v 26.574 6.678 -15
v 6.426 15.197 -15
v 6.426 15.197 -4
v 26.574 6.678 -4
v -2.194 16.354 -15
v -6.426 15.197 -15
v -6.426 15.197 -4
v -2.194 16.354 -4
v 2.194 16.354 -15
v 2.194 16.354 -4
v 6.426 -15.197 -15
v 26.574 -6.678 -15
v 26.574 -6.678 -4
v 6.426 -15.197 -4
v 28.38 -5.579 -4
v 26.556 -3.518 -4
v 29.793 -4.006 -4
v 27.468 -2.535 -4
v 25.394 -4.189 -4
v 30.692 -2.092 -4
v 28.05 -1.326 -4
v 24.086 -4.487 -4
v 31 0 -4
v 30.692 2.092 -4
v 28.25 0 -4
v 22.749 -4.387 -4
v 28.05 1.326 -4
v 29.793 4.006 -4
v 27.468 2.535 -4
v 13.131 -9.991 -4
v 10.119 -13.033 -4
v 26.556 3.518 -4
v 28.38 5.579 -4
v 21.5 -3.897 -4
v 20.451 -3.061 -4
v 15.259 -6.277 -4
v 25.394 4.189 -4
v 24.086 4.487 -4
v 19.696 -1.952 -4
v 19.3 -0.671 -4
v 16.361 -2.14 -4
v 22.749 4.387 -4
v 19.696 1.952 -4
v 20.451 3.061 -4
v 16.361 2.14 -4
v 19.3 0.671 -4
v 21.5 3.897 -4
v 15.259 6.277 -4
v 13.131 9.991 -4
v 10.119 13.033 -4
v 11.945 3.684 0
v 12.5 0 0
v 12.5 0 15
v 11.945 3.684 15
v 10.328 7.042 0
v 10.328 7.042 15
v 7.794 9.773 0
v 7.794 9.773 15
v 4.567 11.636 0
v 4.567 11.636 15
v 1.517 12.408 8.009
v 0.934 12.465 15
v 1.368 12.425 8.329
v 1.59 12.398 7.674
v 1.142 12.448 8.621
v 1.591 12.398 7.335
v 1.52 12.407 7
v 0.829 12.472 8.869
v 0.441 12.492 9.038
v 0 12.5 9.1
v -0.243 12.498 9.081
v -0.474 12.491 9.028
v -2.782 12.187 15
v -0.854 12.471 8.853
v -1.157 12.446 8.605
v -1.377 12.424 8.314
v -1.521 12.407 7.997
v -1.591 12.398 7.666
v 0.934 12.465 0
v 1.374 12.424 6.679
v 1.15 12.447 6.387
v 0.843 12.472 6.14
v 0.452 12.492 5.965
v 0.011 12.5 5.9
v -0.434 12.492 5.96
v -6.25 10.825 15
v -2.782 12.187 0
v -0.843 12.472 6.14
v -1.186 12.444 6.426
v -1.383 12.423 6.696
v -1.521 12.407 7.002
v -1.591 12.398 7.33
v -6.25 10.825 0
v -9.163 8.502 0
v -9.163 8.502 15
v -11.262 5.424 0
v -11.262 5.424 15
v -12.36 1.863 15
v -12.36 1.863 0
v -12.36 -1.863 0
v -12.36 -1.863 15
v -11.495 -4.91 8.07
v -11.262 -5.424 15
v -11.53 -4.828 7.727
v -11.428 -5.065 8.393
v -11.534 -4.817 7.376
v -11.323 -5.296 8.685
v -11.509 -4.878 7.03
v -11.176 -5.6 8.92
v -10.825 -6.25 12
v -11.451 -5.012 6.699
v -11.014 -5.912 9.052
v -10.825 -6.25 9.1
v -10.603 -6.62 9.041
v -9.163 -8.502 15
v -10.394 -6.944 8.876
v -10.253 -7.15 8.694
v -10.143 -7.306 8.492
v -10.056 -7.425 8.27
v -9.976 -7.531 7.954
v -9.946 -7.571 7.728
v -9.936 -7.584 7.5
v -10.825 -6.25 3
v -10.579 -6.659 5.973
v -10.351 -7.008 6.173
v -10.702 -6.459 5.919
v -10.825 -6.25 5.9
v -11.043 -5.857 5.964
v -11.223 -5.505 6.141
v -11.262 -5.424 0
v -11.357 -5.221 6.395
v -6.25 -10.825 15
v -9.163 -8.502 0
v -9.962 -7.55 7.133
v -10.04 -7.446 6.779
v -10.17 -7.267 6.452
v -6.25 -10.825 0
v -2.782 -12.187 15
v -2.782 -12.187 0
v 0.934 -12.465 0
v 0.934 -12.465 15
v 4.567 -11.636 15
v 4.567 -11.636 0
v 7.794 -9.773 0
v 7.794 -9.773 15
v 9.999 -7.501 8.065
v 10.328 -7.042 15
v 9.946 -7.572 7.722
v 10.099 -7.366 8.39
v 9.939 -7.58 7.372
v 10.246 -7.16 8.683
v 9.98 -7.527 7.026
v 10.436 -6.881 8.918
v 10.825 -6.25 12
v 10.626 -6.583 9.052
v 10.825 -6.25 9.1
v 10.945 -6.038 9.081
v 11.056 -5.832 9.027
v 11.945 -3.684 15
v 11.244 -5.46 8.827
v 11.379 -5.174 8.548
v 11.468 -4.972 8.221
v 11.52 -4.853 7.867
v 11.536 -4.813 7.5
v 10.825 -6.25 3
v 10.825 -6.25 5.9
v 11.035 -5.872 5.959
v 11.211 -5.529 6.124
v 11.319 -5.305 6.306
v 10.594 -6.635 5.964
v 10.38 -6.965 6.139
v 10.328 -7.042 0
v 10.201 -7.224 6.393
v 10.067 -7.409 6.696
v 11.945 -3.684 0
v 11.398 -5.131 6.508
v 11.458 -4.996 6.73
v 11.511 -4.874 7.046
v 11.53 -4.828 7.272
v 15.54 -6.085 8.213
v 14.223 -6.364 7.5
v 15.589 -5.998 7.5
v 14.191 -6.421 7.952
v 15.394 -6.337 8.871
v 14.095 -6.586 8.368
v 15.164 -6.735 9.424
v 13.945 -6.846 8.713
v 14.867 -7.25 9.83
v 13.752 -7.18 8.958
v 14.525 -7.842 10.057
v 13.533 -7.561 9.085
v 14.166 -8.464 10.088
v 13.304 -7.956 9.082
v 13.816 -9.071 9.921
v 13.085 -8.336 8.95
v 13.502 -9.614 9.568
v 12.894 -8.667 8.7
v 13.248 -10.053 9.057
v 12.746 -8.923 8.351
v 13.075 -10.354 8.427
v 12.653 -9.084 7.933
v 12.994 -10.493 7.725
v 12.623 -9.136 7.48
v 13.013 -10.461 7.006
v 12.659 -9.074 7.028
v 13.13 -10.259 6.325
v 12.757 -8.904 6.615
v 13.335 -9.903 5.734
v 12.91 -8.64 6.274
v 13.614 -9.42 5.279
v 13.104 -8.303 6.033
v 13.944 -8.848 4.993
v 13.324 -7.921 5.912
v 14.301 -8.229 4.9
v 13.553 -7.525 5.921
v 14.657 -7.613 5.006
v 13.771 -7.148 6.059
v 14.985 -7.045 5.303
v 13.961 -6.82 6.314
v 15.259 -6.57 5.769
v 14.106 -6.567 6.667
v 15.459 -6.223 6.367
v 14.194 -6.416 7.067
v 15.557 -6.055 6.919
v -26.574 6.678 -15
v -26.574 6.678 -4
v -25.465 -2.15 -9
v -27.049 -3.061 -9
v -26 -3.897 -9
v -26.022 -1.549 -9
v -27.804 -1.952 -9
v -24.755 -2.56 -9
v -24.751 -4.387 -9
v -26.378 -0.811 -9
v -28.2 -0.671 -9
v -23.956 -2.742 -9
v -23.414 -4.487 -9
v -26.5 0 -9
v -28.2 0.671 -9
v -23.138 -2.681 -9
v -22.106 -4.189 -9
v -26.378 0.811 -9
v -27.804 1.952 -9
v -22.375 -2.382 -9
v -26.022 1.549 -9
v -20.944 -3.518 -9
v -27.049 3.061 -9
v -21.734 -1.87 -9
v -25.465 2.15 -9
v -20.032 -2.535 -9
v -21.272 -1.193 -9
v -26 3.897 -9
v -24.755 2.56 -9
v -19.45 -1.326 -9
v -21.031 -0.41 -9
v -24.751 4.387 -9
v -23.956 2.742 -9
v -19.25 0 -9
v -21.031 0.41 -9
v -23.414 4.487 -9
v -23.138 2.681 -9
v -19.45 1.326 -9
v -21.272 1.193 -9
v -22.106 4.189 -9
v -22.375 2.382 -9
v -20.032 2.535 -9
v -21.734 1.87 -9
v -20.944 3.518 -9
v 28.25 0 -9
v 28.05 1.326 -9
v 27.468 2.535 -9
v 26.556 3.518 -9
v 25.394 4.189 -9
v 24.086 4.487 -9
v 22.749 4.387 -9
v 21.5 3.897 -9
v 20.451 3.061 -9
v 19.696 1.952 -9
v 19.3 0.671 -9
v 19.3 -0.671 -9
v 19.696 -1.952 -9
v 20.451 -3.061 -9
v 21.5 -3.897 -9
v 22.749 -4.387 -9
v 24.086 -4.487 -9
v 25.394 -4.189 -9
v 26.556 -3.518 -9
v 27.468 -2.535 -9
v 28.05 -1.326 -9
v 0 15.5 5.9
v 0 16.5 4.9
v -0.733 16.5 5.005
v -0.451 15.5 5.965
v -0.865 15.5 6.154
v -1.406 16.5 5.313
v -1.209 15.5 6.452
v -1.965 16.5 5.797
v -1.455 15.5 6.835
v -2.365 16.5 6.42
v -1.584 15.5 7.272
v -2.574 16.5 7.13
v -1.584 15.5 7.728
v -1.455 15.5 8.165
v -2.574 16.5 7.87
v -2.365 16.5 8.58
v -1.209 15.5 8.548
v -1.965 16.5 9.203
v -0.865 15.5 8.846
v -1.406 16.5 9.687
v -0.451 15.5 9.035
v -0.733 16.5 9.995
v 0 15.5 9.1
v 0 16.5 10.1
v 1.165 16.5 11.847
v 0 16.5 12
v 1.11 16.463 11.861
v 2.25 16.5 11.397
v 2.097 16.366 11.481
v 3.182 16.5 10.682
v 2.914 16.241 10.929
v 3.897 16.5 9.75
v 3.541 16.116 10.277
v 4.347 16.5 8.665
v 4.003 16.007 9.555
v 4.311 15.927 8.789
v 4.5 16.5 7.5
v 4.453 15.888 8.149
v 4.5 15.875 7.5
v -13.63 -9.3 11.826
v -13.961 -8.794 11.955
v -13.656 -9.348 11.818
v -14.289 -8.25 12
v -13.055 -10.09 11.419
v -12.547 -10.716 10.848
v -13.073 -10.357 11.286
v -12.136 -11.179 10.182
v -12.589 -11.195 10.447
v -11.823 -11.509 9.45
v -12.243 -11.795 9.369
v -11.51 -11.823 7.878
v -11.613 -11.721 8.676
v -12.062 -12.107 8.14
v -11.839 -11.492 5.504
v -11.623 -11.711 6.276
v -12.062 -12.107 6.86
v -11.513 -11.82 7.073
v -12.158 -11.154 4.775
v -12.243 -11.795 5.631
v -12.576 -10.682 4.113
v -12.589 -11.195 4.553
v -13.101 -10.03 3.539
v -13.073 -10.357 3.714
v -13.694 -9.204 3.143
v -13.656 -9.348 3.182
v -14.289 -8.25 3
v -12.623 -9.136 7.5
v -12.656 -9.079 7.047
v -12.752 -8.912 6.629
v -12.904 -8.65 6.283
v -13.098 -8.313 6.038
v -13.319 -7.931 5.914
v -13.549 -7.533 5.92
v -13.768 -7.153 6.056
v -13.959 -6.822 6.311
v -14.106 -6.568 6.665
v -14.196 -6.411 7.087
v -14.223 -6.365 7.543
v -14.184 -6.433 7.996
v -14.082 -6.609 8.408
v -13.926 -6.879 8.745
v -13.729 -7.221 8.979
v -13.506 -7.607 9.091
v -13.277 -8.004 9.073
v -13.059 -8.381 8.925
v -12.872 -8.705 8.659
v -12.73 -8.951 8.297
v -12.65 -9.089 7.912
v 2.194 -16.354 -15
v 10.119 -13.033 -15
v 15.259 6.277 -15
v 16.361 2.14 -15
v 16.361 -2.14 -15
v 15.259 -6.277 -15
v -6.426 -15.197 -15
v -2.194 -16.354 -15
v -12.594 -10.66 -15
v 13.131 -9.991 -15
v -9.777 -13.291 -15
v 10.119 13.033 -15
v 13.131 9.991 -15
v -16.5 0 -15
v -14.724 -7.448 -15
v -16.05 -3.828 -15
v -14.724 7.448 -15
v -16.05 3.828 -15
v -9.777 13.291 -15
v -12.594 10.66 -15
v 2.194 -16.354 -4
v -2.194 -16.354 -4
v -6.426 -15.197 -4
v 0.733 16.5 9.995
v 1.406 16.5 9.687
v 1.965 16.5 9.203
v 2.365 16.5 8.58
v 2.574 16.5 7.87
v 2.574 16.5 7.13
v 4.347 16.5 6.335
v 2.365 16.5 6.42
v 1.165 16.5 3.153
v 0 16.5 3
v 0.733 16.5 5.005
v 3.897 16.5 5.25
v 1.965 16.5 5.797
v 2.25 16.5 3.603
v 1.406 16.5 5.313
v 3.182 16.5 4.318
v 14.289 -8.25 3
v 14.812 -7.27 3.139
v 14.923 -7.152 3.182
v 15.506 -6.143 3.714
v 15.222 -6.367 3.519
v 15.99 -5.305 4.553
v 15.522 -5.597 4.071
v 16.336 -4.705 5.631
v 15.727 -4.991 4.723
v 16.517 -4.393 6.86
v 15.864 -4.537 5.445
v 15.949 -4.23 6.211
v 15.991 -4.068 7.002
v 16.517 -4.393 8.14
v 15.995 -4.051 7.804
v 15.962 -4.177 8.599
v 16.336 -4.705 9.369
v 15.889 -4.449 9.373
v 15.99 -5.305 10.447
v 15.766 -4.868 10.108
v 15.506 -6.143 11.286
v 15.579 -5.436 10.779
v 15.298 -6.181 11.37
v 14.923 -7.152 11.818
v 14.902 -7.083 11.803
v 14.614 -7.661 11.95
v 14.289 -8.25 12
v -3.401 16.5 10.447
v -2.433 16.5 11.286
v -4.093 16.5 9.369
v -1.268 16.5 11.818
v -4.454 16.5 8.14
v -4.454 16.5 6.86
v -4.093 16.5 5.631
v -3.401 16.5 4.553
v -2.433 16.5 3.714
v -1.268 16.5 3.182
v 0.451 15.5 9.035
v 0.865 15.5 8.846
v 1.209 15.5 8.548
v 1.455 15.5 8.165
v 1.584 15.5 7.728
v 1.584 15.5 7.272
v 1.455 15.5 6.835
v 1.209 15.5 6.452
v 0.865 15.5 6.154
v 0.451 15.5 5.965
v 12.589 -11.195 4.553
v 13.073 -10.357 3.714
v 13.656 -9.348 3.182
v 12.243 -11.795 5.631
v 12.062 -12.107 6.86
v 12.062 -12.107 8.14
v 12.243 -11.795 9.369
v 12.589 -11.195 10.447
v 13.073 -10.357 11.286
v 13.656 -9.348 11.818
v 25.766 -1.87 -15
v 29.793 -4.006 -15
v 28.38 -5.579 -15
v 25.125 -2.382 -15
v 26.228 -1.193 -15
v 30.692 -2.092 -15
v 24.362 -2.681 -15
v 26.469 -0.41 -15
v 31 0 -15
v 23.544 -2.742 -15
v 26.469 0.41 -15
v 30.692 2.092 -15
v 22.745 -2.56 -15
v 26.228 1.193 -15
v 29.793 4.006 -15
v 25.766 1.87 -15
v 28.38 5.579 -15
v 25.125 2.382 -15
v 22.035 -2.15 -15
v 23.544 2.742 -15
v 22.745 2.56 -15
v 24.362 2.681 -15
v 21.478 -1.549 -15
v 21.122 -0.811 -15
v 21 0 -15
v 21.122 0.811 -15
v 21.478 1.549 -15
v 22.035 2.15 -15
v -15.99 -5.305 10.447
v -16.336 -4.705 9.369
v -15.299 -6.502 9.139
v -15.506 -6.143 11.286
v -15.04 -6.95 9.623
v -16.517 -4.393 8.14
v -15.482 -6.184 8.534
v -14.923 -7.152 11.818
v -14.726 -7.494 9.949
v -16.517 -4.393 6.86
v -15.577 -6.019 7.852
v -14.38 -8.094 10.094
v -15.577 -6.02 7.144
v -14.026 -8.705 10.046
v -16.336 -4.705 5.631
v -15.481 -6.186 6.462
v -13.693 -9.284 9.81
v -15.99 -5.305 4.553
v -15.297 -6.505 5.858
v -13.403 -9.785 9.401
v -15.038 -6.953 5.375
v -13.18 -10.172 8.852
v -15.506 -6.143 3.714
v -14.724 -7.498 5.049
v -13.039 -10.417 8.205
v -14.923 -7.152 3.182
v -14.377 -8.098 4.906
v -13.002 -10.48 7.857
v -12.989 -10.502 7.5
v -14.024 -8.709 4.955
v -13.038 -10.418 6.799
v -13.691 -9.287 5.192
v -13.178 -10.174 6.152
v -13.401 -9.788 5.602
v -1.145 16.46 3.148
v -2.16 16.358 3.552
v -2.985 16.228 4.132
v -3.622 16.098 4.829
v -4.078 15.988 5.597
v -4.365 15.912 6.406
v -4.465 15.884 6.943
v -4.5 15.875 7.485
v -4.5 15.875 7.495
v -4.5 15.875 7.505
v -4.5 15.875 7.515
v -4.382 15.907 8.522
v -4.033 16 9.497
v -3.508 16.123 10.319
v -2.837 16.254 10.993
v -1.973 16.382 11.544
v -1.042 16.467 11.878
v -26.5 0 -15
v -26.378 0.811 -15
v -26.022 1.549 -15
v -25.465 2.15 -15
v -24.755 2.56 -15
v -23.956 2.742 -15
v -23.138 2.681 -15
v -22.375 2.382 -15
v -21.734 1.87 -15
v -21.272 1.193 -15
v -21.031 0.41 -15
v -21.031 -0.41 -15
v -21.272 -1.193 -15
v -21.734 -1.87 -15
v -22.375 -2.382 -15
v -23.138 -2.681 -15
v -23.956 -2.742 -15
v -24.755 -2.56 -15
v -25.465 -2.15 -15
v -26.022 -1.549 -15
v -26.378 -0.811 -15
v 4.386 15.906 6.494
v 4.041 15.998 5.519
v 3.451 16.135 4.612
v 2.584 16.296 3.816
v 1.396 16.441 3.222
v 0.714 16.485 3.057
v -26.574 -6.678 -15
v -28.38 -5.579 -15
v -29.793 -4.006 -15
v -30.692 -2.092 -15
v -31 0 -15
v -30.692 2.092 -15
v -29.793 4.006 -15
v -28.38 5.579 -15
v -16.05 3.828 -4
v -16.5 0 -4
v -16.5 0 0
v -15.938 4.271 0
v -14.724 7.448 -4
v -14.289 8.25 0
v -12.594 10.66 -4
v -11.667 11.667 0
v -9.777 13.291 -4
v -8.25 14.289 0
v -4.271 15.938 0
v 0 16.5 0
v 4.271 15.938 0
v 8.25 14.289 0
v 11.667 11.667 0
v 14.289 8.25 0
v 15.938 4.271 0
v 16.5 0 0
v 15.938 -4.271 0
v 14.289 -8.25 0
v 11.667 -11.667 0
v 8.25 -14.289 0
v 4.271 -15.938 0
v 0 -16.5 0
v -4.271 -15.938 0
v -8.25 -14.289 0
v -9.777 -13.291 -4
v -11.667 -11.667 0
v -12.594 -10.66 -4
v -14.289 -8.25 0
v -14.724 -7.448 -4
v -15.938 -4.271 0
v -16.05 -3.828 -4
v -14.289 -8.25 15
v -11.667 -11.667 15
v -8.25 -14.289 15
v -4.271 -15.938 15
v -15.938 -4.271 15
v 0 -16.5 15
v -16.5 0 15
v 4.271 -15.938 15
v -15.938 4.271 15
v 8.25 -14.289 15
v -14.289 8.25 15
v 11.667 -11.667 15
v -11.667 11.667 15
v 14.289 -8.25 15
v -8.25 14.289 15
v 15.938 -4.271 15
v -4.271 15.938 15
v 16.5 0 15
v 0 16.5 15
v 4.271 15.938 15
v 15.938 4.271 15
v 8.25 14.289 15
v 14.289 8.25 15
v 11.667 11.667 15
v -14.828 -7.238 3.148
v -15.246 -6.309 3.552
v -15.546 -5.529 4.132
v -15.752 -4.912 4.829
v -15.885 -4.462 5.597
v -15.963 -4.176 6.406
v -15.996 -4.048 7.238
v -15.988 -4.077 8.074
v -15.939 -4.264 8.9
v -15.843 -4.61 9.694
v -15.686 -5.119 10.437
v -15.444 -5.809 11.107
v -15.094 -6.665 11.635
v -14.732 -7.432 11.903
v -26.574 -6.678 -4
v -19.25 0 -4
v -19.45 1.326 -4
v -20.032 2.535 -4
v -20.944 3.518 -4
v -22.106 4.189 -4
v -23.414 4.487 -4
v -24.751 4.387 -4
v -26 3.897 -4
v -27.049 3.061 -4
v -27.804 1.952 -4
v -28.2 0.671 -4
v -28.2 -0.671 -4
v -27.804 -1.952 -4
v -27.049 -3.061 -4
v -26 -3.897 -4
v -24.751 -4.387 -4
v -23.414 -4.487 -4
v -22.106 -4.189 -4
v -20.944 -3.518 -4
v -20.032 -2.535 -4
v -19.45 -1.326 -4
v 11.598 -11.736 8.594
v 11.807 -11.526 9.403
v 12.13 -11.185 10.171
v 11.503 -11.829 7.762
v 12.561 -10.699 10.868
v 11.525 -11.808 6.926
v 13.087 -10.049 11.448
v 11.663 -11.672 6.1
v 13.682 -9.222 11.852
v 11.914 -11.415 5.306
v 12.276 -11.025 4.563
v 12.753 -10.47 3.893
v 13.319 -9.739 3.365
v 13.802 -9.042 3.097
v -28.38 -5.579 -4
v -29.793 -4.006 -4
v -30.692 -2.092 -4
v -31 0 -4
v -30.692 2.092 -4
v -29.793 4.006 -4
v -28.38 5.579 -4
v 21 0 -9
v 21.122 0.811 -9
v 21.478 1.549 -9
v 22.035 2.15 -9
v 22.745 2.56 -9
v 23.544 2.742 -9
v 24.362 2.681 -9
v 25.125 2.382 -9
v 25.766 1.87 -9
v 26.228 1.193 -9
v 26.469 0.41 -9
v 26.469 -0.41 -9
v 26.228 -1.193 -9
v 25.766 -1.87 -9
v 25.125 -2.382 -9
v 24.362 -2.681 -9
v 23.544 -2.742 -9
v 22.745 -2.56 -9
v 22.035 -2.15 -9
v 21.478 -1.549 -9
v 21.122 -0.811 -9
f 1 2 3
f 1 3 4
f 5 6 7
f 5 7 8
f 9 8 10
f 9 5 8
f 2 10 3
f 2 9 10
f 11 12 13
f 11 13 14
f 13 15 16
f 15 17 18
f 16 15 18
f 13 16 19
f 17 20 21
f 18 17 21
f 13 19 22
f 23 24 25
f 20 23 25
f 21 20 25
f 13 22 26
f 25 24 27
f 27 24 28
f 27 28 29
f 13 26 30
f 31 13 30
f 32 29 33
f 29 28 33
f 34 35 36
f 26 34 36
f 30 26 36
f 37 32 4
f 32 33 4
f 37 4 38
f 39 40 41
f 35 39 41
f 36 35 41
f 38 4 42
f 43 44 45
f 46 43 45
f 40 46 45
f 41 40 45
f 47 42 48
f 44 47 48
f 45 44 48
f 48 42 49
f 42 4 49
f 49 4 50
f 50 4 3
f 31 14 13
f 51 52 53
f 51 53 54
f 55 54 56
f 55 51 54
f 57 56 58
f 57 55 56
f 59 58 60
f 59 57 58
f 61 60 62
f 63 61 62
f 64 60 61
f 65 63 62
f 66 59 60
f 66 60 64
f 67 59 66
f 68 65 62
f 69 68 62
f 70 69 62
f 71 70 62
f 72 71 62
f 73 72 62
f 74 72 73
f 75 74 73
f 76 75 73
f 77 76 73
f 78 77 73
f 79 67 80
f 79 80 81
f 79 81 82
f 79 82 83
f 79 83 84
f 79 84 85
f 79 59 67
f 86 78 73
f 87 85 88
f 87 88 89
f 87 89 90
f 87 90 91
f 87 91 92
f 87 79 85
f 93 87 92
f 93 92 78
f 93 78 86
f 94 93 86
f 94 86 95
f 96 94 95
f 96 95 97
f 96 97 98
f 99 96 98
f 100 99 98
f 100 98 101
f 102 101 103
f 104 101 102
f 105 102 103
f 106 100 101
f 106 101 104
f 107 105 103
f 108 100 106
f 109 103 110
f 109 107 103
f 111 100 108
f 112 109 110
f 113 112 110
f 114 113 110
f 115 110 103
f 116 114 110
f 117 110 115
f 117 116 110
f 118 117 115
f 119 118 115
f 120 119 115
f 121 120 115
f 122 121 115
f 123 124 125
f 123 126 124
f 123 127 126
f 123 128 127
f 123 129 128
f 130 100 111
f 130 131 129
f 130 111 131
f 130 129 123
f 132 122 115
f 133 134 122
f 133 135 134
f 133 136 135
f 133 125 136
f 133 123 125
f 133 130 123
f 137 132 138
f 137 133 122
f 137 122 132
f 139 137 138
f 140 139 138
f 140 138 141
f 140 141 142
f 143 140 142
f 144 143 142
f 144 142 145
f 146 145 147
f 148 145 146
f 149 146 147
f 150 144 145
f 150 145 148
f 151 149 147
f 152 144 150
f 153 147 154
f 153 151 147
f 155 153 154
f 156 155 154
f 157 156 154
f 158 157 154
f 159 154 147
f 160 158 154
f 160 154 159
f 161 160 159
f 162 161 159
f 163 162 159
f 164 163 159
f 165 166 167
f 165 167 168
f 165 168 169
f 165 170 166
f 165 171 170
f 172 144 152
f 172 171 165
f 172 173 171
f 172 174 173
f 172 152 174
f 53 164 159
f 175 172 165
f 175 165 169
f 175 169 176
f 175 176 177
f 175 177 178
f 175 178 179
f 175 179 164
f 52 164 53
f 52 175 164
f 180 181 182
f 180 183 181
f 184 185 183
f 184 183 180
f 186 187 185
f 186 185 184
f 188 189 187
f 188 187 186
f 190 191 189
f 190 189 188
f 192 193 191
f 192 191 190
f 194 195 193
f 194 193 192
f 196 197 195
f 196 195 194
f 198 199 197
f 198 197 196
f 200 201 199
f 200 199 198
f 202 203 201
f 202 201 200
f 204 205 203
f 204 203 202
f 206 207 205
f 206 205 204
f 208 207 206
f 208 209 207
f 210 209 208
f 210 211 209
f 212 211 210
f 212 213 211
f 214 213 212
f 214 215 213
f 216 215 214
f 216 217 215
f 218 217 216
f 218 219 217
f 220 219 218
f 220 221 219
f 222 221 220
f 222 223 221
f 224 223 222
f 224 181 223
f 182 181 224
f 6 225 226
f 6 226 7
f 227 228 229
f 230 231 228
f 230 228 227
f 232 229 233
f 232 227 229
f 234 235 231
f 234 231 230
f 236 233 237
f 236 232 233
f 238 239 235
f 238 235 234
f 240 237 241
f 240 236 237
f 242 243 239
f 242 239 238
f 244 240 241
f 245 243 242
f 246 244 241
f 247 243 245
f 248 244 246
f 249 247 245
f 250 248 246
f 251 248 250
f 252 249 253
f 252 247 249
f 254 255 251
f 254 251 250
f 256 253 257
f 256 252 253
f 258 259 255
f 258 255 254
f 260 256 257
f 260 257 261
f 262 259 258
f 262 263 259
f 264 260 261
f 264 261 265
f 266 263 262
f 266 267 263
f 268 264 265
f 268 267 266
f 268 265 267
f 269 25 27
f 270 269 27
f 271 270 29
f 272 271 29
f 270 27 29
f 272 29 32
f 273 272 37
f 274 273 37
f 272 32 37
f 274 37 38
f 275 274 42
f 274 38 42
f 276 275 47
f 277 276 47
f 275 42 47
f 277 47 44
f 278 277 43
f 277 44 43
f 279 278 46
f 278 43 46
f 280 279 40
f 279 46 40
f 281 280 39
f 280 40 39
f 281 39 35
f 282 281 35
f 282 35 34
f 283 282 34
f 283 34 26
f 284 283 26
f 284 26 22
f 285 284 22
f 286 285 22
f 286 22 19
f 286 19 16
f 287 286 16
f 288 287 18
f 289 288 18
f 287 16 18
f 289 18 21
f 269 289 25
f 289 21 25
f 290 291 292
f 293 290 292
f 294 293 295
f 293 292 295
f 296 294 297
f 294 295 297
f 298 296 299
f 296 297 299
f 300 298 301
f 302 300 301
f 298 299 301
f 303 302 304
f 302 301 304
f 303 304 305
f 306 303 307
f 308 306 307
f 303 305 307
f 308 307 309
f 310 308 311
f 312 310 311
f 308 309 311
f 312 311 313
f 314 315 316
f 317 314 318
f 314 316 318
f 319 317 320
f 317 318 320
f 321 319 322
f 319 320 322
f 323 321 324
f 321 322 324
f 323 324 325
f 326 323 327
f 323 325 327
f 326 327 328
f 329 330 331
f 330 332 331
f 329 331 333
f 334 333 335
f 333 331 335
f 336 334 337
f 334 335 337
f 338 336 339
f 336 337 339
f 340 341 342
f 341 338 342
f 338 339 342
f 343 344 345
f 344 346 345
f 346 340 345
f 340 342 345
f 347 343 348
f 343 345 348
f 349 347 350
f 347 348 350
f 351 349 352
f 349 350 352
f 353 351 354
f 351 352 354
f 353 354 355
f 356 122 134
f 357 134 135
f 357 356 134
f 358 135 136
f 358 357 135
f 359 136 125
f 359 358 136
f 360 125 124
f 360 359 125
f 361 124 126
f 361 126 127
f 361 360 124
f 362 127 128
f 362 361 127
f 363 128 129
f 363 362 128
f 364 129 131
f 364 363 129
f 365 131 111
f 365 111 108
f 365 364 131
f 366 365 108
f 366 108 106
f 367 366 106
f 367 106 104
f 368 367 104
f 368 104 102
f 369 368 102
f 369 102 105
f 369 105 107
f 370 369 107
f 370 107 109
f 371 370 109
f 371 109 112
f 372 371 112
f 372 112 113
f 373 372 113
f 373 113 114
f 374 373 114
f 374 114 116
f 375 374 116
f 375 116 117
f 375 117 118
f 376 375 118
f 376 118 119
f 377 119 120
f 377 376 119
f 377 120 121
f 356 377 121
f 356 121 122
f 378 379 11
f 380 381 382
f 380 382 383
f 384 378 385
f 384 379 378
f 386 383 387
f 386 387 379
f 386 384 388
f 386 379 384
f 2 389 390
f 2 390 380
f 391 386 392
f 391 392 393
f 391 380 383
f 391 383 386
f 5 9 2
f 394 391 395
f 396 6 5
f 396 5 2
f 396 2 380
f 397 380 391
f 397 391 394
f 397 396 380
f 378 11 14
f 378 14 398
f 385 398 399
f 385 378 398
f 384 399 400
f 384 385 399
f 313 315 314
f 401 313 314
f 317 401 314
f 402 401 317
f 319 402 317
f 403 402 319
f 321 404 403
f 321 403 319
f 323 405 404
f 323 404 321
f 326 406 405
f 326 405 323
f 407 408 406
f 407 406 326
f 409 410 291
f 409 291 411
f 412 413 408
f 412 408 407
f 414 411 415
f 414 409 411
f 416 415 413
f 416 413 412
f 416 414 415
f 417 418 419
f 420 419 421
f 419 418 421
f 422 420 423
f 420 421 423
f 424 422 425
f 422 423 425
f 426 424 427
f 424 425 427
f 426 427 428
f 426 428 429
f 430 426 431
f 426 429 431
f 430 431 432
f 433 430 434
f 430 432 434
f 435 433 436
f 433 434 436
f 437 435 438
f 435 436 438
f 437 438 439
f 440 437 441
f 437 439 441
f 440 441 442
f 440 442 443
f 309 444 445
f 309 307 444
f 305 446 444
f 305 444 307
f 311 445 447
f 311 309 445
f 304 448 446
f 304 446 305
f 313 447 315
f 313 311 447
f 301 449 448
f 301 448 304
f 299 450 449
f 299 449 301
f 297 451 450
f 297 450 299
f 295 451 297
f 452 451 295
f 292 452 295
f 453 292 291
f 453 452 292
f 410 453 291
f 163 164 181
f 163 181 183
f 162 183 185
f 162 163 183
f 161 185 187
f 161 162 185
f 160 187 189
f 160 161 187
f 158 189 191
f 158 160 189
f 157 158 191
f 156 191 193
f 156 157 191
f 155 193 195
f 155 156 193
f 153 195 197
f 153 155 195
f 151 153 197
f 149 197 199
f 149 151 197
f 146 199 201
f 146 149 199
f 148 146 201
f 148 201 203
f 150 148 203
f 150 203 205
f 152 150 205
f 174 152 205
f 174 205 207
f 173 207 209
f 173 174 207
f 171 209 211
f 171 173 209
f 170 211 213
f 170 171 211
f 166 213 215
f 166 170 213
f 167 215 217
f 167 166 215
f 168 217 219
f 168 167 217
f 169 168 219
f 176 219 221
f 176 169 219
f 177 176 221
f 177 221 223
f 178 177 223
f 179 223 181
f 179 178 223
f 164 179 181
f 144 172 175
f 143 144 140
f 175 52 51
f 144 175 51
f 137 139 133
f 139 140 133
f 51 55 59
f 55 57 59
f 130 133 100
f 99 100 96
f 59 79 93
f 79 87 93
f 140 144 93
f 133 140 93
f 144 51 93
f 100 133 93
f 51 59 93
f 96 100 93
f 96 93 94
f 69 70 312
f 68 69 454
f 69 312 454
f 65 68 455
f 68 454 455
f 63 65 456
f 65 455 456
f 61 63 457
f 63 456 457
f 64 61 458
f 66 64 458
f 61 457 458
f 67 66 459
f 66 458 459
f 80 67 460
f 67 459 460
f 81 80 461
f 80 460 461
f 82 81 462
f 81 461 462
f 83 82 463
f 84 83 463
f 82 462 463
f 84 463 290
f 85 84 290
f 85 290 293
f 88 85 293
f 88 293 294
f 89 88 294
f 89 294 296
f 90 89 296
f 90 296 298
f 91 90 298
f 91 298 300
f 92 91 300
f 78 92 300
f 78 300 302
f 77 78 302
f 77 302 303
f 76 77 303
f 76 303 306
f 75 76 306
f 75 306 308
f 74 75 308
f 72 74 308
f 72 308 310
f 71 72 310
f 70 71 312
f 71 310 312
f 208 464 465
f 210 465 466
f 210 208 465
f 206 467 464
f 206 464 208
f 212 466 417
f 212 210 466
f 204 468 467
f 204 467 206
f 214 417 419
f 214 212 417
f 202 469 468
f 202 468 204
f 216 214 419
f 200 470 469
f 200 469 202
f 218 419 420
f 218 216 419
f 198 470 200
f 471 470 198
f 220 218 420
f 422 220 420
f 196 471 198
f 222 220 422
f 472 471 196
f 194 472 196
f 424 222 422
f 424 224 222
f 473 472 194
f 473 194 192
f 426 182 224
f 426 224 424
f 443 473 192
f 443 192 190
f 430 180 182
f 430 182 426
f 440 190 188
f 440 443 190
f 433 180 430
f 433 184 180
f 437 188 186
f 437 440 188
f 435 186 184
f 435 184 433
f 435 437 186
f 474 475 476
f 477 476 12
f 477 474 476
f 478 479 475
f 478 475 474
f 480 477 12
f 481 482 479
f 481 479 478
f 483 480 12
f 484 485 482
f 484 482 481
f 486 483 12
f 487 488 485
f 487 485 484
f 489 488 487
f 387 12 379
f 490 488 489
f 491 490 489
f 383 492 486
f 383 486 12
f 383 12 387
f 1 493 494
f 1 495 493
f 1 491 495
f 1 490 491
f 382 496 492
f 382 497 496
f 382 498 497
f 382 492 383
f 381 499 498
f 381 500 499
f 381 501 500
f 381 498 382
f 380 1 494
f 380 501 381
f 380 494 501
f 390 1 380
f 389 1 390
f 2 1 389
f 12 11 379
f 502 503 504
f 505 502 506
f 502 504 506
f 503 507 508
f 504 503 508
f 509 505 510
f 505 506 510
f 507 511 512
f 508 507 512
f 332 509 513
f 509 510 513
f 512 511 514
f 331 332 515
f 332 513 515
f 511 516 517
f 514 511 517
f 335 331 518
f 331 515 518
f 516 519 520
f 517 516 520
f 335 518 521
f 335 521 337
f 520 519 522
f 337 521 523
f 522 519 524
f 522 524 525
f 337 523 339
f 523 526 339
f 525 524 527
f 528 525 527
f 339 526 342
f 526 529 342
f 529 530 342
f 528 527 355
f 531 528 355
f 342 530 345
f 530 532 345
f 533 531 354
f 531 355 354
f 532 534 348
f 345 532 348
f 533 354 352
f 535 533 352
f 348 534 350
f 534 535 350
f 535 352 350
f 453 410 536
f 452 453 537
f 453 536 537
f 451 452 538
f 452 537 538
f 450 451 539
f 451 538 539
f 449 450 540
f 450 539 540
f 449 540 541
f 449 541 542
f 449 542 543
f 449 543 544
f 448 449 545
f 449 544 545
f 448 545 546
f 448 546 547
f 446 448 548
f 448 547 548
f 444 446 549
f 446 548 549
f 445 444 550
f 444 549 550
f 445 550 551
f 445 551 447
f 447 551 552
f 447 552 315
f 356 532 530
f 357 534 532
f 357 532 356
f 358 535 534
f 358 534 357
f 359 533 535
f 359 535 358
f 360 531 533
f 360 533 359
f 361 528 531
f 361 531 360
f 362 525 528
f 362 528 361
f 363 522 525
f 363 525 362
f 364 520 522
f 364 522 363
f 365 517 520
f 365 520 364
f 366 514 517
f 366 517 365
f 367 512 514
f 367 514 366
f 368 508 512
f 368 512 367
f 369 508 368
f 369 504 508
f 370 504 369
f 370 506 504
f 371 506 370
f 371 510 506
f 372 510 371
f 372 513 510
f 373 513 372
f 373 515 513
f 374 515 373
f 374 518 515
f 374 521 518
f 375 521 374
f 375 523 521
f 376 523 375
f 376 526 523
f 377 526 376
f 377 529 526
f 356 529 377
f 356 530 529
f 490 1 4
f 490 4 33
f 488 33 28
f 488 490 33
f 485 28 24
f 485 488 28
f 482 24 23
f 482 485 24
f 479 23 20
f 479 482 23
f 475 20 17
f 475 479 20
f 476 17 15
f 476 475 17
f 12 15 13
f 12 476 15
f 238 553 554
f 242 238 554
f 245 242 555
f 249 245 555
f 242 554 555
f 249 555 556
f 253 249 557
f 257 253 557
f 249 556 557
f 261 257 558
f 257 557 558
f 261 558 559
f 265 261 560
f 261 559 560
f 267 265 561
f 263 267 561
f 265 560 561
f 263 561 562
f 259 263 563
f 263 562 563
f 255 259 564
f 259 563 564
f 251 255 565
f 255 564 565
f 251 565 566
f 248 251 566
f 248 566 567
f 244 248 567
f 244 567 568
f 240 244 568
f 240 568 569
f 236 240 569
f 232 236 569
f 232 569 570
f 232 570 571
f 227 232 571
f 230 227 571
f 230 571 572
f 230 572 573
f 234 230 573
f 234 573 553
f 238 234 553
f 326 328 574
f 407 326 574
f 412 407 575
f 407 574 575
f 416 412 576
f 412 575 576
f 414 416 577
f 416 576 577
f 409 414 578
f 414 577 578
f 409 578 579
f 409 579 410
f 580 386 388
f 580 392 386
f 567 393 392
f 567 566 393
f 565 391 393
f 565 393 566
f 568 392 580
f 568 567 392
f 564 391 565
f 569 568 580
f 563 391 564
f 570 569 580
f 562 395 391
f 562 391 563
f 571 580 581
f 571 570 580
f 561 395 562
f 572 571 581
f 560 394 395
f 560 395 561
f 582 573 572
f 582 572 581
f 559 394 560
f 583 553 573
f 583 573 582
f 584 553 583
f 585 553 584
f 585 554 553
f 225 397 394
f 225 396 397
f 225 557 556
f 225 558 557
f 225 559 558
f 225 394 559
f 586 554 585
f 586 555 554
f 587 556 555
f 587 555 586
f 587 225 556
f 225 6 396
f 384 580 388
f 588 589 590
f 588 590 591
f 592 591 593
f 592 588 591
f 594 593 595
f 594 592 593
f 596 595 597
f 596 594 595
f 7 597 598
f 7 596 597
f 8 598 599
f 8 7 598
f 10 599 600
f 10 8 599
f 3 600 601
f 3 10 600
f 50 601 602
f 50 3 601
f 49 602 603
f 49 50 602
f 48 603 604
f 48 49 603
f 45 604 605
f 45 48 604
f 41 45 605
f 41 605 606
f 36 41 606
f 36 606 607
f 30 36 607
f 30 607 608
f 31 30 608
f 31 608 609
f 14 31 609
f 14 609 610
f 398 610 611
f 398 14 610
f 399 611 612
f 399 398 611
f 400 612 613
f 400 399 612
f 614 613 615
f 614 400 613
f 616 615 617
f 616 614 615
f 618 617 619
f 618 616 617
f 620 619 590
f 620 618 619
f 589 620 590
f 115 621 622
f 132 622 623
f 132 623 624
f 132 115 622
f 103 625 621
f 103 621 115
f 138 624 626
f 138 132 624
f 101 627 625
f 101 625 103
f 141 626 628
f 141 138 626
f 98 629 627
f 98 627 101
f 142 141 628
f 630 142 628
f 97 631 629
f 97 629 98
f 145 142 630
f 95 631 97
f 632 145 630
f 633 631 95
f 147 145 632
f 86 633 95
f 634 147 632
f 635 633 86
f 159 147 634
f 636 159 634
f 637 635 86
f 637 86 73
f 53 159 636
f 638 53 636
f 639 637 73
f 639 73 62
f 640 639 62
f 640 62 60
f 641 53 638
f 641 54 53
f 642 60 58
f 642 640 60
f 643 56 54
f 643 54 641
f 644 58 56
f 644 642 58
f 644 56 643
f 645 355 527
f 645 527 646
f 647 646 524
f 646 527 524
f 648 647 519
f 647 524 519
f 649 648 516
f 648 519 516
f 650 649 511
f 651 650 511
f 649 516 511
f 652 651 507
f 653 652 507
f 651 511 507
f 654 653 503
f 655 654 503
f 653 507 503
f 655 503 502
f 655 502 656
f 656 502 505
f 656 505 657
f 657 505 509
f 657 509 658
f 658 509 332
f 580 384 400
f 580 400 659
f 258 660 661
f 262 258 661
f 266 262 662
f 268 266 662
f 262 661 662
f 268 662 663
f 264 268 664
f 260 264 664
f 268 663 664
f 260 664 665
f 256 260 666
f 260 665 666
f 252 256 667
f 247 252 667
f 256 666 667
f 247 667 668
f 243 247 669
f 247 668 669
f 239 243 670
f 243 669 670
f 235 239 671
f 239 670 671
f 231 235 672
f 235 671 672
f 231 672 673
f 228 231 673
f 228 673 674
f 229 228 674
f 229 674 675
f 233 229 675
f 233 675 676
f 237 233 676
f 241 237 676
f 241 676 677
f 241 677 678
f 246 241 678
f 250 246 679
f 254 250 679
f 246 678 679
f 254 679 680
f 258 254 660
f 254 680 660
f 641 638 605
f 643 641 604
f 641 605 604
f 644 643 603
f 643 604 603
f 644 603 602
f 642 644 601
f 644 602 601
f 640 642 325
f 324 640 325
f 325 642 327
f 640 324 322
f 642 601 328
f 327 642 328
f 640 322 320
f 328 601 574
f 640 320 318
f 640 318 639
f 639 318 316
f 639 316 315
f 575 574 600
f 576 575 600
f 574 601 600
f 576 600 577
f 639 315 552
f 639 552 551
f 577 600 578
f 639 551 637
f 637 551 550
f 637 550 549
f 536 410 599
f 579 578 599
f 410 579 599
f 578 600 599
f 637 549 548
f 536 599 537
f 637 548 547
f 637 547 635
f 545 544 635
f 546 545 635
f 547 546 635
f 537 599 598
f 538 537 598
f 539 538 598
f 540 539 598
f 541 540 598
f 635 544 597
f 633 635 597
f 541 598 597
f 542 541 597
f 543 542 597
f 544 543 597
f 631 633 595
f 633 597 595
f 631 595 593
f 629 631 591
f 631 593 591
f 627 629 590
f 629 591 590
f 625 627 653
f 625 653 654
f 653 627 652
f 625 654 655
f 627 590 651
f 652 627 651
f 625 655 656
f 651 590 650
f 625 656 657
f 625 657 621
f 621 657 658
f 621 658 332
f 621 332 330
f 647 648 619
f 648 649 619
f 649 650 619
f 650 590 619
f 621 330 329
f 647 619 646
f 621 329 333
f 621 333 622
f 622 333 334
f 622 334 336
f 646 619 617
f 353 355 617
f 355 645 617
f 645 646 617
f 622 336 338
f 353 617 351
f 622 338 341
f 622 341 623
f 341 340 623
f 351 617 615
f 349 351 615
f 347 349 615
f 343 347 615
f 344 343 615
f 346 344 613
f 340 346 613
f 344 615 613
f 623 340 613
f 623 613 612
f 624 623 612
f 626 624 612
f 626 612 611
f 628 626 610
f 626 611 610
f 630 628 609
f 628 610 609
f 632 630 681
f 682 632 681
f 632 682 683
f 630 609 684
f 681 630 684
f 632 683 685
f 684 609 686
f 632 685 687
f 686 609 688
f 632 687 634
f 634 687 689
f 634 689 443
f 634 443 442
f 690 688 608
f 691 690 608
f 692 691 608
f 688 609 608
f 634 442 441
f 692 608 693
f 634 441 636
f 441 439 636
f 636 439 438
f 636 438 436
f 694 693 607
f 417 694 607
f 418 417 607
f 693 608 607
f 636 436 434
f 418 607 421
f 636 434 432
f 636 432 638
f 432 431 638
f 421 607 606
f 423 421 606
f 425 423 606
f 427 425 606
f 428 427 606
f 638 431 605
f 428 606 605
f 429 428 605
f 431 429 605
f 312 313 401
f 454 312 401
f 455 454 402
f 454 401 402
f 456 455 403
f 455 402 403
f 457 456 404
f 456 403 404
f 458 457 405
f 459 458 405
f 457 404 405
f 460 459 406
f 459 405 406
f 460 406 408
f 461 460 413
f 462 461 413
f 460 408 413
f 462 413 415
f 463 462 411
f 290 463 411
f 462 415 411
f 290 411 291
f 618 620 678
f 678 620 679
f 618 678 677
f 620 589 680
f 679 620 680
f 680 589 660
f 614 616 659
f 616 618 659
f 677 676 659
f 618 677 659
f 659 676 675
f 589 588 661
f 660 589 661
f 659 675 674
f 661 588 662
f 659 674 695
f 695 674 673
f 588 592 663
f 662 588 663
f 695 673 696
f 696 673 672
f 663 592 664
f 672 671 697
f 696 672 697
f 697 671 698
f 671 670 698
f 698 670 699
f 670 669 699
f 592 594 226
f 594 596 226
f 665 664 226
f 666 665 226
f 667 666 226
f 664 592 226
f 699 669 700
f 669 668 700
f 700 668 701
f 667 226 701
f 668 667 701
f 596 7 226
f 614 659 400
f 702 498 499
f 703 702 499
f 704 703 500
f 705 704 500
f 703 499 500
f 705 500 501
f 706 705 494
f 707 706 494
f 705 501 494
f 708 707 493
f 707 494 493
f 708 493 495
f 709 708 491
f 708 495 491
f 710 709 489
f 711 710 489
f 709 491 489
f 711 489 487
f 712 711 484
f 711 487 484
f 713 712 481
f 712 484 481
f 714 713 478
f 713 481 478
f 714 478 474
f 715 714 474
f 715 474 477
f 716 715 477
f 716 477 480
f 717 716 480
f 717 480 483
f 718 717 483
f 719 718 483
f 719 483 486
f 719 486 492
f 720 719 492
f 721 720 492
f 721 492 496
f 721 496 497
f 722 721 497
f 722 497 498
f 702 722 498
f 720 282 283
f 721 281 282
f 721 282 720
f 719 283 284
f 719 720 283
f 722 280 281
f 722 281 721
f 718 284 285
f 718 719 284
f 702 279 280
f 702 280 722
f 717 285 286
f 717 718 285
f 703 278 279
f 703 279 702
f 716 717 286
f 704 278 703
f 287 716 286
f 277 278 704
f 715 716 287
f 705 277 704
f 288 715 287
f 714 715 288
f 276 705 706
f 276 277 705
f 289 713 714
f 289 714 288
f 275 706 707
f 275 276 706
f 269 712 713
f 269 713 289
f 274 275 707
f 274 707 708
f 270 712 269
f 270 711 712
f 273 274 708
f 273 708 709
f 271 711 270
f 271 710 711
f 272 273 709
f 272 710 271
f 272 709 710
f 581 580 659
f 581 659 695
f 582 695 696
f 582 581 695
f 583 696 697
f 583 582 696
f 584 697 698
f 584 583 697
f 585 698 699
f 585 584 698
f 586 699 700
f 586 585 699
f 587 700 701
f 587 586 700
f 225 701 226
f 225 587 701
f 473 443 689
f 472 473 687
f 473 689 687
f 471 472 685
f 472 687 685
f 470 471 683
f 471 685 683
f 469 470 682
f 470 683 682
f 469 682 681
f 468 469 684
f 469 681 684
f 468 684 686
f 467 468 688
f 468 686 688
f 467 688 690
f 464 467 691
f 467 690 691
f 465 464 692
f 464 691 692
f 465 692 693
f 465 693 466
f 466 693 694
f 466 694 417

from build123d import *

# Parameters (mm, degrees)
SKETCH1_R                = 16.5
SKETCH1_R_2              = 12.5
BOSS_EXTRUDE1_DEPTH      = 15
BOSS_EXTRUDE2_START      = 15
SKETCH2_R                = 16.5
BOSS_EXTRUDE2_DEPTH      = 15
BOSS_EXTRUDE3_REACH      = 41.828
BOSS_EXTRUDE3_END_RADIUS = 16.5
SKETCH3_R                = 4.5
CUT_EXTRUDE1_REACH       = 41.828
CUT_EXTRUDE1_END_RADIUS  = 12.5
SKETCH4_R                = 1.6
CIRPATTERN1_COUNT        = 3
CHAMFER1_SIZE            = 1
SKETCH5_R                = 2.75
BOSS_EXTRUDE4_DEPTH      = 11
SKETCH6_R                = 4.5
CUT_EXTRUDE2_DEPTH       = 5


with BuildPart() as part:
    # Sketch1 → Boss-Extrude1 (new body)
    with BuildSketch(Plane.XY):
        Circle(SKETCH1_R)
        Circle(SKETCH1_R_2, mode=Mode.SUBTRACT)
    extrude(amount=BOSS_EXTRUDE1_DEPTH)

    # Sketch2 → Boss-Extrude2 (add)
    with BuildSketch(Plane(origin=(0, 0, 0), x_dir=(-1, 0, 0), z_dir=(0, 0, -1)).offset(BOSS_EXTRUDE2_START)):
        Circle(SKETCH2_R)
    extrude(amount=-BOSS_EXTRUDE2_DEPTH)

    # Boss-Extrude3: up to this cylinder (the profile starts outside it)
    boss_extrude3_end = Plane(origin=(0, 0, 7.5), z_dir=(0, 0, -1)) * Cylinder(BOSS_EXTRUDE3_END_RADIUS, 117.656, mode=Mode.PRIVATE)
    # Sketch3 → Boss-Extrude3 (add, up to the surface)
    with BuildSketch(Plane(origin=(0, 16.5, 0), x_dir=(1, 0, 0), z_dir=(0, 1, 0)), mode=Mode.PRIVATE) as boss_extrude3_sk1:
        with Locations((0, -7.5)):
            Circle(SKETCH3_R)
    boss_extrude3_tool1 = extrude(boss_extrude3_sk1.sketch, amount=-BOSS_EXTRUDE3_REACH, mode=Mode.PRIVATE) - boss_extrude3_end
    boss_extrude3 = boss_extrude3_tool1.solids().sort_by_distance((0, 16.5, 7.5))[0] + boss_extrude3_tool1.solids().sort_by_distance((0, 16.5, 7.5))[1]
    add(boss_extrude3)

    # Cut-Extrude1: up to this cylinder (the profile starts outside it)
    cut_extrude1_end = Plane(origin=(0, 0, 7.5), z_dir=(0, 0, -1)) * Cylinder(CUT_EXTRUDE1_END_RADIUS, 109.656, mode=Mode.PRIVATE)
    # Sketch4 → Cut-Extrude1 (cut, up to the surface)
    with BuildSketch(Plane(origin=(0, 16.5, 0), x_dir=(1, 0, 0), z_dir=(0, 1, 0)), mode=Mode.PRIVATE) as cut_extrude1_sk1:
        with Locations((0, -7.5)):
            Circle(SKETCH4_R)
    cut_extrude1_tool1 = extrude(cut_extrude1_sk1.sketch, amount=-CUT_EXTRUDE1_REACH, mode=Mode.PRIVATE) - cut_extrude1_end
    cut_extrude1 = cut_extrude1_tool1.solids().sort_by_distance((0, 16.5, 7.5))[0]
    add(cut_extrude1, mode=Mode.SUBTRACT)

    # CirPattern1: Boss-Extrude3, Cut-Extrude1 ×3 about axis
    cirpattern1_axis = Axis((0, 0, 15), (0, 0, 1))
    add([boss_extrude3.rotate(cirpattern1_axis, i * 360 / CIRPATTERN1_COUNT) for i in range(1, CIRPATTERN1_COUNT)])
    add([cut_extrude1.rotate(cirpattern1_axis, i * 360 / CIRPATTERN1_COUNT) for i in range(1, CIRPATTERN1_COUNT)], mode=Mode.SUBTRACT)

    # Chamfer1
    chamfer1_edges = [part.edges().sort_by_distance(p)[0] for p in [
        (-13.489419162, -9.635640646, 7.5),
        (15.089419162, -6.864359354, 7.5),
        (-1.6, 16.5, 7.5),
    ]]
    chamfer(chamfer1_edges, length=CHAMFER1_SIZE)

    # Sketch5 → Boss-Extrude4 (add)
    with BuildSketch(Plane(origin=(0, 0, -15), x_dir=(-1, 0, 0), z_dir=(0, 0, -1))):
        with BuildLine():
            Line((26.573684211, 6.677522556), (6.426315789, 15.197120299))
            ThreePointArc((6.426315789, 15.197120299), (0, 16.5), (-6.426315789, 15.197120299))
            Line((-6.426315789, 15.197120299), (-26.573684211, 6.677522556))
            ThreePointArc((-26.573684211, 6.677522556), (-31, 0), (-26.573684211, -6.677522556))
            Line((-26.573684211, -6.677522556), (-6.426315789, -15.197120299))
            ThreePointArc((-6.426315789, -15.197120299), (0, -16.5), (6.426315789, -15.197120299))
            Line((6.426315789, -15.197120299), (26.573684211, -6.677522556))
            ThreePointArc((26.573684211, -6.677522556), (31, 0), (26.573684211, 6.677522556))
        make_face()
        with Locations((23.75, 0)):
            Circle(SKETCH5_R, mode=Mode.SUBTRACT)
        with Locations((-23.75, 0)):
            Circle(SKETCH5_R, mode=Mode.SUBTRACT)
    extrude(amount=-BOSS_EXTRUDE4_DEPTH)

    # Sketch6 → Cut-Extrude2 (cut)
    with BuildSketch(Plane.XY.offset(-4)):
        with Locations((-23.75, 0)):
            Circle(SKETCH6_R)
        with Locations((23.75, 0)):
            Circle(SKETCH6_R)
    extrude(amount=-CUT_EXTRUDE2_DEPTH, mode=Mode.SUBTRACT)


solid = part.part
